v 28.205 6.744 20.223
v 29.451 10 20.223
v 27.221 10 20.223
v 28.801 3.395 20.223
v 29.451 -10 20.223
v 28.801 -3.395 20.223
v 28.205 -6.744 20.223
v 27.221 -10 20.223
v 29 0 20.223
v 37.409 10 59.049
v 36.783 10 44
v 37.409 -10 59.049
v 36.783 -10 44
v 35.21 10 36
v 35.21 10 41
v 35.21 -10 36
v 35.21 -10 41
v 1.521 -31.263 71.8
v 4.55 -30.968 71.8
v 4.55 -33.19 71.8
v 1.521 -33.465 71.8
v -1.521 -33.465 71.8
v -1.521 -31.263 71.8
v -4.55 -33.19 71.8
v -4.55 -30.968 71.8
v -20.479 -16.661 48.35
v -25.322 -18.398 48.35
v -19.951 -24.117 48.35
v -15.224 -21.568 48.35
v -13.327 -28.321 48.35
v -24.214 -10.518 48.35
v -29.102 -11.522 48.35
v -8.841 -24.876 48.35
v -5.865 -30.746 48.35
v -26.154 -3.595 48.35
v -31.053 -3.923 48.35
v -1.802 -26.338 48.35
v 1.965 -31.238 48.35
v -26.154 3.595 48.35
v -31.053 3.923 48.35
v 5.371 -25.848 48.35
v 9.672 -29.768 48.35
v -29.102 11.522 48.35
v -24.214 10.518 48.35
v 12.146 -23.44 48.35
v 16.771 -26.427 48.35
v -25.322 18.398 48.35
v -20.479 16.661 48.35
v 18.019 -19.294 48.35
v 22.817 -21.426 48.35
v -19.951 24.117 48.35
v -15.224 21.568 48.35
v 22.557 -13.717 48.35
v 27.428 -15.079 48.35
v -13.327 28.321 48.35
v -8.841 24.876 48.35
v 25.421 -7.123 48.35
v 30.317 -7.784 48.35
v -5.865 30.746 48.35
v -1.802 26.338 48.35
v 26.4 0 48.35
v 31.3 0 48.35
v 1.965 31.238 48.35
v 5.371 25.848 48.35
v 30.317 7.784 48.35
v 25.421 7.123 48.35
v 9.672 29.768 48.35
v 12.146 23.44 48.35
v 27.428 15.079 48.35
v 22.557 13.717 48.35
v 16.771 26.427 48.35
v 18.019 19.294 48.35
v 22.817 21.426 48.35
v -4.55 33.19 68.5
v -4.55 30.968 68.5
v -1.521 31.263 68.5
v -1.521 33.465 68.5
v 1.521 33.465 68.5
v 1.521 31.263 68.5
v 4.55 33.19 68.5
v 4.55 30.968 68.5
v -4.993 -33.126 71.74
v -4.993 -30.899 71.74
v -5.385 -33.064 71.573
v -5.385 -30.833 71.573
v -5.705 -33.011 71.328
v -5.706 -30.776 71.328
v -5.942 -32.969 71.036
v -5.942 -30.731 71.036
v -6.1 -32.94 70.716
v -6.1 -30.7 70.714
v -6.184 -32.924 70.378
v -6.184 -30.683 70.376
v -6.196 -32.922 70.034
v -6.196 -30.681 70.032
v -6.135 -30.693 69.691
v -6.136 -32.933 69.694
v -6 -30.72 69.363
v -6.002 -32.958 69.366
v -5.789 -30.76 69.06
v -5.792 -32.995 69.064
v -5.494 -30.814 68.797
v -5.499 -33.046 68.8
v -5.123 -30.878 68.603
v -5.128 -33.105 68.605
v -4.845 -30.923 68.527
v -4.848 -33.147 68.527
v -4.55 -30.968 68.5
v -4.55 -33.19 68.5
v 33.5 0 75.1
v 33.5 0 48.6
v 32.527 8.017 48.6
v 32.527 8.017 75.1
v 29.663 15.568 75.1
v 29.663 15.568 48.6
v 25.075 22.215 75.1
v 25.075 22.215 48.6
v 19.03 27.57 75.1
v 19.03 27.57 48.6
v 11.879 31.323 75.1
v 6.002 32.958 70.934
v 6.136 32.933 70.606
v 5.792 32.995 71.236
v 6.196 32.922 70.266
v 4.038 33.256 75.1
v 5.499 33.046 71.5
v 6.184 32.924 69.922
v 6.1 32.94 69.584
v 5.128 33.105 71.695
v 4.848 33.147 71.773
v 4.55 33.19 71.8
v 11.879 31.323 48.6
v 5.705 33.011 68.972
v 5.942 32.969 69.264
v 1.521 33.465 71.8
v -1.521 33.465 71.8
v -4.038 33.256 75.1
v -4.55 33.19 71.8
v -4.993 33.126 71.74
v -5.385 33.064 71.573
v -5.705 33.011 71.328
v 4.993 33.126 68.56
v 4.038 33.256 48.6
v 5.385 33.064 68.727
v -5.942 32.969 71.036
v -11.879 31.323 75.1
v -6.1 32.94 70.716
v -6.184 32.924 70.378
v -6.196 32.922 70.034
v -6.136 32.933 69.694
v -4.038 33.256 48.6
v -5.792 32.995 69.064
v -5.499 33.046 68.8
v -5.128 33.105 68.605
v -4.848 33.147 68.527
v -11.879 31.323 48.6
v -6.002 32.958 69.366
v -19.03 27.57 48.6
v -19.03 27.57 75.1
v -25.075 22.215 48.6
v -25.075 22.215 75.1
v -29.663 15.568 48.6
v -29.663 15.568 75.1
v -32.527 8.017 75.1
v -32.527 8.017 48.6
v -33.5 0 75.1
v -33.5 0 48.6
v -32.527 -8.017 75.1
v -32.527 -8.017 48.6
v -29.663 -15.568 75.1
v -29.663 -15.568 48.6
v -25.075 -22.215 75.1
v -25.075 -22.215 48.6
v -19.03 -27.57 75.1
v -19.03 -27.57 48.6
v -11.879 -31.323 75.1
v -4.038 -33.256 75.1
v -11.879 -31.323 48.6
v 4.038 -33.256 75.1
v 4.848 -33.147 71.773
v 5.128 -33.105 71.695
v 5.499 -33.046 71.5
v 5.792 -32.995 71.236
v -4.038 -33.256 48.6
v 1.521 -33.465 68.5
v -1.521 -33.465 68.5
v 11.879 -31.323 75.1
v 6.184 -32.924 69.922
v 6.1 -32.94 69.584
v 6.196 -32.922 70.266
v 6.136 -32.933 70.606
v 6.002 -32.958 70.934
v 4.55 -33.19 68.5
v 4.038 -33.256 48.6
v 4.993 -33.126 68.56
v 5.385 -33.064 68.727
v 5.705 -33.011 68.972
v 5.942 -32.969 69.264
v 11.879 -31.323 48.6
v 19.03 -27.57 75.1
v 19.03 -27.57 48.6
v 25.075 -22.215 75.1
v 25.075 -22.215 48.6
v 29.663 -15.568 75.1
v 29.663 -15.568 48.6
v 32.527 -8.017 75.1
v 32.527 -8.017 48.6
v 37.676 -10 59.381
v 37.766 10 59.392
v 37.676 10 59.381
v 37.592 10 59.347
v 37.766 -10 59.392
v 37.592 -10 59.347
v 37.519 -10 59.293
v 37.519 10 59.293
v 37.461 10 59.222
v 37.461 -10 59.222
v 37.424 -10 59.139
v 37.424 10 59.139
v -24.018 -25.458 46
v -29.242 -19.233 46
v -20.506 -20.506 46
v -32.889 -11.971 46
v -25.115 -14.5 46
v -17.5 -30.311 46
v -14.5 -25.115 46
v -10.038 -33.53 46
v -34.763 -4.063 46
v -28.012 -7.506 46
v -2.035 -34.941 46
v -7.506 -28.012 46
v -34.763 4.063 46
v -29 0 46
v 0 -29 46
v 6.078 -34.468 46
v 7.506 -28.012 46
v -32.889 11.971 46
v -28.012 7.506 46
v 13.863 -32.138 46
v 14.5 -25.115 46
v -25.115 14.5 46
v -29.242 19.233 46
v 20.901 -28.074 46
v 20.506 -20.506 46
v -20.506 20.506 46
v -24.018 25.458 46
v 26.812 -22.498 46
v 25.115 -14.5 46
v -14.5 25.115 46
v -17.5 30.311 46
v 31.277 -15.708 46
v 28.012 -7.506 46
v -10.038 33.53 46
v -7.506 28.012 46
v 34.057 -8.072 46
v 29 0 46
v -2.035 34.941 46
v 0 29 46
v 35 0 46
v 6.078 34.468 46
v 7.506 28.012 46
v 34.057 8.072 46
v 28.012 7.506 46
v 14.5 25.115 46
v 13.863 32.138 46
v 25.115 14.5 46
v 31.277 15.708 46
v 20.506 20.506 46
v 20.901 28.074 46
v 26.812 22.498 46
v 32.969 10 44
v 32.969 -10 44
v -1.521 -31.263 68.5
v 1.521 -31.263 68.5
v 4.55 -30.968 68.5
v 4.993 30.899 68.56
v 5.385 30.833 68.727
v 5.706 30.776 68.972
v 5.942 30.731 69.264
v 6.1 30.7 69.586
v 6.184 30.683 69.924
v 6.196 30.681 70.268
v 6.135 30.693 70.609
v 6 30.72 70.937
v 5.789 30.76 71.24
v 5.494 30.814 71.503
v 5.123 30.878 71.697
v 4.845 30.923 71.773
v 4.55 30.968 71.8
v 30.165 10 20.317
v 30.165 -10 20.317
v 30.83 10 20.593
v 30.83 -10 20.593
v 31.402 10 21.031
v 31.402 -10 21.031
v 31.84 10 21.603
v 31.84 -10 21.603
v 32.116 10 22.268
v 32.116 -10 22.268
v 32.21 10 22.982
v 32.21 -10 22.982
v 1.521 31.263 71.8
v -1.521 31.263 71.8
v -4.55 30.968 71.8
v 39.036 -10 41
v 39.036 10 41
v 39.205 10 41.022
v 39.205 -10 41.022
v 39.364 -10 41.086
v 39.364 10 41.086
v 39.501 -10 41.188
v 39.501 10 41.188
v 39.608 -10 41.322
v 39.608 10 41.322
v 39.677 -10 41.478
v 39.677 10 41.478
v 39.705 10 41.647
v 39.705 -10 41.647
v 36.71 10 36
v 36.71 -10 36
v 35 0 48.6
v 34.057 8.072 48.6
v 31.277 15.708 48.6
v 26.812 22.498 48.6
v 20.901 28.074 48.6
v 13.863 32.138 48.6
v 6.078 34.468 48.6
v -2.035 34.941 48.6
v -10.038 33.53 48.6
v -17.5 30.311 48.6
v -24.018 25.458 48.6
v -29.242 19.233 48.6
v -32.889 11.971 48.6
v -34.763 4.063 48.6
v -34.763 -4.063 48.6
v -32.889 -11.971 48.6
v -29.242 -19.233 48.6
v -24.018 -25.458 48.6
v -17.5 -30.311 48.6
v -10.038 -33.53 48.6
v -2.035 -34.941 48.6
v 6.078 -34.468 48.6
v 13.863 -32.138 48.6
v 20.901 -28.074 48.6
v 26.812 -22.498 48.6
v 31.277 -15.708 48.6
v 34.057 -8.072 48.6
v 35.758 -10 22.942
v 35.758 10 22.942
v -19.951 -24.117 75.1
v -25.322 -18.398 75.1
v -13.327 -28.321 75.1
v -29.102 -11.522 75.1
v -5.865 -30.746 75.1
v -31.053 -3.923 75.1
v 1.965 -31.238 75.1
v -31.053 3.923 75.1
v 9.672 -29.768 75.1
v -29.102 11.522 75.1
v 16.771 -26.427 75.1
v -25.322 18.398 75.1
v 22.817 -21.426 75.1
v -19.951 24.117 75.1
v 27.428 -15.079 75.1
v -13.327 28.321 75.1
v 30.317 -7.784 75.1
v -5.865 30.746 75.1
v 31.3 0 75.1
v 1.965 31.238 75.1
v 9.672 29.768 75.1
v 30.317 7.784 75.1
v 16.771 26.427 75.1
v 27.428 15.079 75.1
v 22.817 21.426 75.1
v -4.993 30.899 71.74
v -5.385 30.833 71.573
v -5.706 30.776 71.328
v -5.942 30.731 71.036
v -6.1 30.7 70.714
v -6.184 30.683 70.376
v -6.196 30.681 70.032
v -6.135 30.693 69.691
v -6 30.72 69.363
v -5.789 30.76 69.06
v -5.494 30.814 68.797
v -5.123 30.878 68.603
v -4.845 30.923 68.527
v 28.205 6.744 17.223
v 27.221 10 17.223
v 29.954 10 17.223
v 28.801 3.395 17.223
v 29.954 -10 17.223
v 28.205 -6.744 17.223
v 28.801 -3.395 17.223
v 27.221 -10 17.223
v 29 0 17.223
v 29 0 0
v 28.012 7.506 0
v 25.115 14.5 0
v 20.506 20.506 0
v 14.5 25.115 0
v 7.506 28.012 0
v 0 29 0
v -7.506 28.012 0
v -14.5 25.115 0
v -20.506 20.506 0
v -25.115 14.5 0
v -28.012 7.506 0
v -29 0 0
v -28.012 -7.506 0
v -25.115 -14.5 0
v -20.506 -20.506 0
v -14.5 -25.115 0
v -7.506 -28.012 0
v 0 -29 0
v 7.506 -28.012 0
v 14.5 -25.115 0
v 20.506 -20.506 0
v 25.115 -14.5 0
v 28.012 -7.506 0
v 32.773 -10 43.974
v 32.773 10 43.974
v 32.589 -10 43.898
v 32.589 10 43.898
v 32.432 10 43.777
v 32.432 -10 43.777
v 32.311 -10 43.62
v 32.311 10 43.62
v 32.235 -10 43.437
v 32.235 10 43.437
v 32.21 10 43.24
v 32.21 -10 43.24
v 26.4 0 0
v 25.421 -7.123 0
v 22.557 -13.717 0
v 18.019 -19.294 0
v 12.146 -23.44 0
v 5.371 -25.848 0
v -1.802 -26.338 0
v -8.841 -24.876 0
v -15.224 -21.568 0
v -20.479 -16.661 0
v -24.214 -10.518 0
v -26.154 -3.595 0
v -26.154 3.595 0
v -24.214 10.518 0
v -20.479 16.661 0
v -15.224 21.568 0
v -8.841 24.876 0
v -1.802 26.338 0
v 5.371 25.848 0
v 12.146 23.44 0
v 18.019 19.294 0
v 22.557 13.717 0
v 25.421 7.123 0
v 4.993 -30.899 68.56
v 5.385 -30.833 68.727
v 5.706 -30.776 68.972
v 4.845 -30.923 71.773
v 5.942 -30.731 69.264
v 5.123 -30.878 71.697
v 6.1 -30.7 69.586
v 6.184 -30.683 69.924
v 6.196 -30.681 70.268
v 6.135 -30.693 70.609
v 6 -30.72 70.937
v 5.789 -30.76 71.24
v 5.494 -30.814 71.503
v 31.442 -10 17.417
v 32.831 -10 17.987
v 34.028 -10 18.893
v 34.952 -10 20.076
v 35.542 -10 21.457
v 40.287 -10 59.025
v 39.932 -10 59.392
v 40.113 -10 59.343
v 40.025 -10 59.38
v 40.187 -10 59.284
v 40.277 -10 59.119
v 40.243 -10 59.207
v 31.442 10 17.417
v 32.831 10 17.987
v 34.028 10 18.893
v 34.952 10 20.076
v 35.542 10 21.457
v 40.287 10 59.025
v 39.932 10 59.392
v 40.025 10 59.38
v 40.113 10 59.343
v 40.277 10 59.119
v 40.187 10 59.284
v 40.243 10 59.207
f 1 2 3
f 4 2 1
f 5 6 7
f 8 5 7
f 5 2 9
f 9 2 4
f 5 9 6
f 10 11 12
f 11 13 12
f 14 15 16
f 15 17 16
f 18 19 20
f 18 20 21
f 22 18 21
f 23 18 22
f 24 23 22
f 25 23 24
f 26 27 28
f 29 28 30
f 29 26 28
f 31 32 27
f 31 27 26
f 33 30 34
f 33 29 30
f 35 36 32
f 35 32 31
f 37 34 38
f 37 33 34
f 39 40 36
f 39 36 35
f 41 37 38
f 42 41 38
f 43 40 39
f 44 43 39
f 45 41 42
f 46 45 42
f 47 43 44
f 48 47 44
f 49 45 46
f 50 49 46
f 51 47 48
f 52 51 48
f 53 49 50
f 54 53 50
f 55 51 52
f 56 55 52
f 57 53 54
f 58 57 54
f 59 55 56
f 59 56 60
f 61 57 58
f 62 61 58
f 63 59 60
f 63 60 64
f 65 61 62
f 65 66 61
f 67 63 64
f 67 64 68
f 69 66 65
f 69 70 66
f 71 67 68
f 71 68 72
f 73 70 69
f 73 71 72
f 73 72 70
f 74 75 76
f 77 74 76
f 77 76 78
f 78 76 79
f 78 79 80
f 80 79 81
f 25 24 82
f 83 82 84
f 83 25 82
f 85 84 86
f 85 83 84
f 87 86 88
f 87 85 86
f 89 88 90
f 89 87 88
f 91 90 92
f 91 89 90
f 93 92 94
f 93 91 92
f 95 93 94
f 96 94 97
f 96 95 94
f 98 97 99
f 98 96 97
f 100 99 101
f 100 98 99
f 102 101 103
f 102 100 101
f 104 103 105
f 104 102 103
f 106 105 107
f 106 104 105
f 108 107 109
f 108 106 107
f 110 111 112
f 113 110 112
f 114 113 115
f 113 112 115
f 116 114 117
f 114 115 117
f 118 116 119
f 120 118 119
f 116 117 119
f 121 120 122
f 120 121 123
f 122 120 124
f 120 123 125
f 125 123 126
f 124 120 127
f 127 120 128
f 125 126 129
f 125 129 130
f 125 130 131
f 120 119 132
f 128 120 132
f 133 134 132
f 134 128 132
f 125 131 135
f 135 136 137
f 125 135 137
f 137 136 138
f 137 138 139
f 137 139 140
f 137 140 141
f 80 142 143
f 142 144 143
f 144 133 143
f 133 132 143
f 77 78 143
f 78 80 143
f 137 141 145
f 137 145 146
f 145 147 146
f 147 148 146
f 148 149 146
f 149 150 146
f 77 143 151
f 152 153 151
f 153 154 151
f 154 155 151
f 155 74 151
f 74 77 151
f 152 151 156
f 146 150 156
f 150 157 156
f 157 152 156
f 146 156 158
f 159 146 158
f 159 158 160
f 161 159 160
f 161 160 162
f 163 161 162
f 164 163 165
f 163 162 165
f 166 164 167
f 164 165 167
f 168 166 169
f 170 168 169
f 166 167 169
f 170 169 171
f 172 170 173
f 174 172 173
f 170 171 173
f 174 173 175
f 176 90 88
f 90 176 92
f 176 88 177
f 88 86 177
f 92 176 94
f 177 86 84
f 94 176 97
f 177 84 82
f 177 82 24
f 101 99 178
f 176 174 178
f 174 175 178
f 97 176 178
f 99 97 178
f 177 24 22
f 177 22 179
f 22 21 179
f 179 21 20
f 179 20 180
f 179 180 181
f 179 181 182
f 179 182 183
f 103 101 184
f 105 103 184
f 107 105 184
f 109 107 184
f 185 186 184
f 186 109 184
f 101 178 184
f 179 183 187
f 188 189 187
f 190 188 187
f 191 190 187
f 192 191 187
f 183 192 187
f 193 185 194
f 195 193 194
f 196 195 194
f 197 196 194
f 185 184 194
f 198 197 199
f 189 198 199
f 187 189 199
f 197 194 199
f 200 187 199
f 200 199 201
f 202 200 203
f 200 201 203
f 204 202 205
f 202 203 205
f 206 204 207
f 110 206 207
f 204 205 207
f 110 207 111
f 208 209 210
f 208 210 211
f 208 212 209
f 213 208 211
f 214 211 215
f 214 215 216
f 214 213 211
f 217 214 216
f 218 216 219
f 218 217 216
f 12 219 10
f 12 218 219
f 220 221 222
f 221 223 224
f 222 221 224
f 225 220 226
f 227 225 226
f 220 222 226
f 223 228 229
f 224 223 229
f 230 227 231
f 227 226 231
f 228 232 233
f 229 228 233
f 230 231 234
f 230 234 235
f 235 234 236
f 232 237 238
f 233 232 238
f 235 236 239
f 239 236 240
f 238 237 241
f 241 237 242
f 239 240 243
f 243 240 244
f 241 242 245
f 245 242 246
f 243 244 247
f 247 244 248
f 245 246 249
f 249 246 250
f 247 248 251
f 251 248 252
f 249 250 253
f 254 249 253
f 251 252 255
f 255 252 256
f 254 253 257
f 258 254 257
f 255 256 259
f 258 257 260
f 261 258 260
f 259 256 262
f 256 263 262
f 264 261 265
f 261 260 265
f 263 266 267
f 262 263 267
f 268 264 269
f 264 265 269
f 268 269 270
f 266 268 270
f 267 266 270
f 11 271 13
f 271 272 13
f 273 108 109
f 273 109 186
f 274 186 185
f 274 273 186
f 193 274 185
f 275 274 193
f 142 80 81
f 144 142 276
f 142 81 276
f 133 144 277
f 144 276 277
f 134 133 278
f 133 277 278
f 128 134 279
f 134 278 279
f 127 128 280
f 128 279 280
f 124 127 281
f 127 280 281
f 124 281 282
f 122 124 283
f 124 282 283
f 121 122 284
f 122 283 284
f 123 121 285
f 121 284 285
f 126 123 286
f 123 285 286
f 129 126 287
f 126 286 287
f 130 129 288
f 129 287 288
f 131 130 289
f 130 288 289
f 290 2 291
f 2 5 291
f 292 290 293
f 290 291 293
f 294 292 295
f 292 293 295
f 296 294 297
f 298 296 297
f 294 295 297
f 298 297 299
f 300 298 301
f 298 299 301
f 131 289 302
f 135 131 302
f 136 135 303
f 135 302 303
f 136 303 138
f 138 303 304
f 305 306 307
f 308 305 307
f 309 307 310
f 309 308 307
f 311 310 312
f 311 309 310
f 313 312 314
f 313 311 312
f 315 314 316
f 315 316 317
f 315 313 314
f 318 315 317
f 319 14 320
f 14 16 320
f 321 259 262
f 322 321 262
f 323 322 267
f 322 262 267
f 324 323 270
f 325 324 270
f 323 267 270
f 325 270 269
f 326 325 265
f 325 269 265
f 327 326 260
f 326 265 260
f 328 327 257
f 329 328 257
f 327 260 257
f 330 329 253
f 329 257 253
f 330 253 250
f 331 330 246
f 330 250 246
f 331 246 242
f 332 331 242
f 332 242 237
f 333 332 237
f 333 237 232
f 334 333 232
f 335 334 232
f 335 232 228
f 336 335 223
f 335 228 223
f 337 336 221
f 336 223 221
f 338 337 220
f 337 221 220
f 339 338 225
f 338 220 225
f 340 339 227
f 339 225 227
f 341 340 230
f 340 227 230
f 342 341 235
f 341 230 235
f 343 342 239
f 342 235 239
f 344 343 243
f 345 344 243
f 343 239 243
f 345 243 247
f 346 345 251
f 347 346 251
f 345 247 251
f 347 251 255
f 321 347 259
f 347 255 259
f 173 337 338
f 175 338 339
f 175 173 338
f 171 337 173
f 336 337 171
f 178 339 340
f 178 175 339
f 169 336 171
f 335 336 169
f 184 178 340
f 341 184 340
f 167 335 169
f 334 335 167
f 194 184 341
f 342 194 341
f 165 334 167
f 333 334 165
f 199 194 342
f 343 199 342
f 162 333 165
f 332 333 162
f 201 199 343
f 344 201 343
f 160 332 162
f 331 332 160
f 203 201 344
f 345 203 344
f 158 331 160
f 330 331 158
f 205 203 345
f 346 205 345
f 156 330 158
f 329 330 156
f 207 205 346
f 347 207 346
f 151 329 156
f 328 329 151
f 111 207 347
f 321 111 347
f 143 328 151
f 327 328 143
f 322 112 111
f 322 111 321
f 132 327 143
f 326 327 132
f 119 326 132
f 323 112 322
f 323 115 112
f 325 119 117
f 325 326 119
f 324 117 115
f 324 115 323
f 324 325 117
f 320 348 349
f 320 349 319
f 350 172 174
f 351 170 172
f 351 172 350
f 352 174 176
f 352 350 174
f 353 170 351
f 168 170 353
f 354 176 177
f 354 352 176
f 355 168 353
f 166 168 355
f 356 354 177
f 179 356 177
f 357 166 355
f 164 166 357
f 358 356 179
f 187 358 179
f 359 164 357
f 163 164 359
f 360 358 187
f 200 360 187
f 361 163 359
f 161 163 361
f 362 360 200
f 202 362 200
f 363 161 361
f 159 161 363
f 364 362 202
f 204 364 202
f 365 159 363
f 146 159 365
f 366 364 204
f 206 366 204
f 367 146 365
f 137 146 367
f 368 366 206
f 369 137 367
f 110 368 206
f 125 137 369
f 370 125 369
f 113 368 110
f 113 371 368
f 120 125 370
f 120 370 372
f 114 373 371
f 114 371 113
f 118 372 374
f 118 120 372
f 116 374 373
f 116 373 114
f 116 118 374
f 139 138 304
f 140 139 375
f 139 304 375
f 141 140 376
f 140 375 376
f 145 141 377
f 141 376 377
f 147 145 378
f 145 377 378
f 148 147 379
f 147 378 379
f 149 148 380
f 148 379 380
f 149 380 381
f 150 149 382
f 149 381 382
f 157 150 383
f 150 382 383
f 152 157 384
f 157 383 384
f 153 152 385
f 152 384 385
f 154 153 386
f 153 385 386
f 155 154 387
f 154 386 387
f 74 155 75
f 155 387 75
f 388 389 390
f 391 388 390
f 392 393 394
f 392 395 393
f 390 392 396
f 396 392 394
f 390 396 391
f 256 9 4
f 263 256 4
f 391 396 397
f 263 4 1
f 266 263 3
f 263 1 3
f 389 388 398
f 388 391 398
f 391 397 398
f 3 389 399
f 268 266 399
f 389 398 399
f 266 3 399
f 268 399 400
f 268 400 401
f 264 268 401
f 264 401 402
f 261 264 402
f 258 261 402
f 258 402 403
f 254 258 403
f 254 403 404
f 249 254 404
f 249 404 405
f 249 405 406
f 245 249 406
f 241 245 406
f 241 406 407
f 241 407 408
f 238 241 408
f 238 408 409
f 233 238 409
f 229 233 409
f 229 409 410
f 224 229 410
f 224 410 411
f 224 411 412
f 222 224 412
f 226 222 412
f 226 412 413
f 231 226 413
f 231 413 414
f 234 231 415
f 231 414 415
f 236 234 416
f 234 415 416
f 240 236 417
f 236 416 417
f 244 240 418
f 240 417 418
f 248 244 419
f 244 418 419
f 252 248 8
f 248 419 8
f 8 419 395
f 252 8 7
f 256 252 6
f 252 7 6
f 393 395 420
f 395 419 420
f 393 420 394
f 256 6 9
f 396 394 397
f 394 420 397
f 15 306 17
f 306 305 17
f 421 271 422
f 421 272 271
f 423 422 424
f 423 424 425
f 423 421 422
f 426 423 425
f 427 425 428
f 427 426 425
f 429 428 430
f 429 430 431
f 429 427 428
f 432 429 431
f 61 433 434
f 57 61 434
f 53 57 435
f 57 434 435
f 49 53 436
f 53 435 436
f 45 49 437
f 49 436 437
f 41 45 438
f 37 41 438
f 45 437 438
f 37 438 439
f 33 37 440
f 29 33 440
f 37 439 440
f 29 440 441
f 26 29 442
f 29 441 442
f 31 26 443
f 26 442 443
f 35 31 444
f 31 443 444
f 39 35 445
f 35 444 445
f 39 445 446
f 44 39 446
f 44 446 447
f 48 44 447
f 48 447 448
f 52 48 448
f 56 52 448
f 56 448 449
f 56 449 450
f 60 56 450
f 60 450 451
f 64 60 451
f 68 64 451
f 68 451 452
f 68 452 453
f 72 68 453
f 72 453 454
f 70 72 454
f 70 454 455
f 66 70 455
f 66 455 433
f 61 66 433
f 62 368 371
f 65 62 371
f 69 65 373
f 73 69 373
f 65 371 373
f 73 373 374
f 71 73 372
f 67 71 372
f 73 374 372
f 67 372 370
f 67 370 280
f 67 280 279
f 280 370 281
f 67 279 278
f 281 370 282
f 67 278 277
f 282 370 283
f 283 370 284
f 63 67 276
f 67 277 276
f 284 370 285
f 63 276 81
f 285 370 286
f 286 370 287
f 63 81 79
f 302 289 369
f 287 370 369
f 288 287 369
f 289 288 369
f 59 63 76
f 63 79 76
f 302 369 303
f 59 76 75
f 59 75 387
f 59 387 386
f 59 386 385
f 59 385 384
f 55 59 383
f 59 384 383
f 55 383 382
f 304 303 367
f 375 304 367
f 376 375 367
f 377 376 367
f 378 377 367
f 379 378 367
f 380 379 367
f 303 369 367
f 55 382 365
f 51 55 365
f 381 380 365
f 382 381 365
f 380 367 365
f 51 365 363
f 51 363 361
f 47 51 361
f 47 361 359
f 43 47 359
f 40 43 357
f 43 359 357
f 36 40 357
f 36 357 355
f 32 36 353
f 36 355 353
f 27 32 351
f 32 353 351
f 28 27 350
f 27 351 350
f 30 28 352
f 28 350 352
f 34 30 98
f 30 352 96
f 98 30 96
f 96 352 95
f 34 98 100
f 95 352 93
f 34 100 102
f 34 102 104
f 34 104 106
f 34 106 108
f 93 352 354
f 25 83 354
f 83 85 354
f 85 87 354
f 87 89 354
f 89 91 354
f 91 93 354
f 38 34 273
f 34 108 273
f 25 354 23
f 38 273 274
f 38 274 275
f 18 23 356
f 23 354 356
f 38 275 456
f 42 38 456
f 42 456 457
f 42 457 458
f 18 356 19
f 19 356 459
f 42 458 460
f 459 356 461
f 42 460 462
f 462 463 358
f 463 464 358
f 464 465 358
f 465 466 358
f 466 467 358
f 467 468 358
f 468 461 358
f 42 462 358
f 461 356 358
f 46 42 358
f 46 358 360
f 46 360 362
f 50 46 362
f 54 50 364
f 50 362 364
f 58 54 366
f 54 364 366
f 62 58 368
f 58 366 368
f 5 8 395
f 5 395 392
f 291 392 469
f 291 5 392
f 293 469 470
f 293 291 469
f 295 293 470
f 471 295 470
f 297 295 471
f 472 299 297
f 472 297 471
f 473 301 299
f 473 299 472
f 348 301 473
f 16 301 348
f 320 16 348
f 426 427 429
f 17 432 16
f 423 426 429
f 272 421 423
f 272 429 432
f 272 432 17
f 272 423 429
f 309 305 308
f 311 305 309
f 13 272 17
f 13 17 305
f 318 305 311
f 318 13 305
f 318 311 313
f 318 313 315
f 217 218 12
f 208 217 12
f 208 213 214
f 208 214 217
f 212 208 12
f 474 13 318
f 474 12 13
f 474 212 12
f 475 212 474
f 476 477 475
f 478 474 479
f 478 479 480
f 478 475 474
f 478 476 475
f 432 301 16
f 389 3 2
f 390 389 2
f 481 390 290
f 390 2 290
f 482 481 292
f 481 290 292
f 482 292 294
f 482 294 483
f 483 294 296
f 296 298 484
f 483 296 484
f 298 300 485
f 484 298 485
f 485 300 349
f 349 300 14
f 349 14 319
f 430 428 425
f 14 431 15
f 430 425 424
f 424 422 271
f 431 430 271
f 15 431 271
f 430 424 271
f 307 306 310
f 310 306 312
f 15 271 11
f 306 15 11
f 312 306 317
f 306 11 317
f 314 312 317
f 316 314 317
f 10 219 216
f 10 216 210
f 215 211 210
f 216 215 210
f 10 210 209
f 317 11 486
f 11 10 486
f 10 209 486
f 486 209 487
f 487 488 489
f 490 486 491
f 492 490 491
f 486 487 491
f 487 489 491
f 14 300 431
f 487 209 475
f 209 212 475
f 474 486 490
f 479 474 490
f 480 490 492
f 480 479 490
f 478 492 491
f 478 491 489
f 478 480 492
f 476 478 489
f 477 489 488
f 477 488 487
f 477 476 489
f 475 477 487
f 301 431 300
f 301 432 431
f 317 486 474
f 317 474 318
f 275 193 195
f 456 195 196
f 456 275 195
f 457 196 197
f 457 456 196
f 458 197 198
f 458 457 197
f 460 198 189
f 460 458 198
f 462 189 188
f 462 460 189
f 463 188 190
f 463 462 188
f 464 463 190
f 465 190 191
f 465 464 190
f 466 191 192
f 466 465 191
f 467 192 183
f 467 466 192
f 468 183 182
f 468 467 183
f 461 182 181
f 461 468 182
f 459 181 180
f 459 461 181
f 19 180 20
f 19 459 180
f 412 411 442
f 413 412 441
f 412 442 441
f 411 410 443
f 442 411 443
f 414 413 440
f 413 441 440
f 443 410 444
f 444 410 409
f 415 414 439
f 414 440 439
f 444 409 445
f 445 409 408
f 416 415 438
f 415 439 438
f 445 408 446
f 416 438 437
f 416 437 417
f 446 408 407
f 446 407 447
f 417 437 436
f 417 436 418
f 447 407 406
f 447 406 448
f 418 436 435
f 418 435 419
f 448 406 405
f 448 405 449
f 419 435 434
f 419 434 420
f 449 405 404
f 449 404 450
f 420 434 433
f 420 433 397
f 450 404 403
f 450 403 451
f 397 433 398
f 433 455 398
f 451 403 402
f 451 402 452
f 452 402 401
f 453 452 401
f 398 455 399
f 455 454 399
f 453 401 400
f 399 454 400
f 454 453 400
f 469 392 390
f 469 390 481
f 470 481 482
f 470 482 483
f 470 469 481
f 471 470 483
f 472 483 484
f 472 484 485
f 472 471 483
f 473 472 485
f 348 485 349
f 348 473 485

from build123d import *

# Parameters (mm, degrees)
SKETCH_R             = 29
PAD_DEPTH            = 46
SKETCH001_R          = 35
PAD001_DEPTH         = 2.6
SKETCH002_R          = 33.5
PAD002_DEPTH         = 26.5
SKETCH003_R          = 26.4
POCKET_DEPTH         = 75.101
SKETCH004_R          = 31.3
POCKET001_DEPTH      = 26.75
POCKET002_DEPTH      = 35.001
POCKET002_DEPTH_BACK = -35.001
PAD003_DEPTH         = 10
PAD003_DEPTH_BACK    = 10


with BuildPart() as part:
    # Sketch → Pad (new body)
    with BuildSketch(Plane.XY):
        Circle(SKETCH_R)
    extrude(amount=PAD_DEPTH)

    # Sketch001 (on Face3 of Pad) → Pad001 (join)
    with BuildSketch(Plane.XY.offset(46)):
        Circle(SKETCH001_R)
    extrude(amount=PAD001_DEPTH)

    # Sketch002 (on Face3 of Pad001) → Pad002 (join)
    with BuildSketch(Plane.XY.offset(48.6)):
        Circle(SKETCH002_R)
    extrude(amount=PAD002_DEPTH)

    # Sketch003 (on Face6 of Pad002) → Pocket (cut, through all)
    with BuildSketch(Plane(origin=(0, 0, 0), x_dir=(1, 0, 0), z_dir=(0, 0, -1))):
        Circle(SKETCH003_R)
    extrude(amount=-POCKET_DEPTH, mode=Mode.SUBTRACT)

    # Sketch004 (on Face7 of Pocket) → Pocket001 (cut)
    with BuildSketch(Plane.XY.offset(75.1)):
        Circle(SKETCH004_R)
    extrude(amount=-POCKET001_DEPTH, mode=Mode.SUBTRACT)

    # Sketch005 → Pocket002 (cut, two sides)
    with BuildSketch(Plane.XZ) as pocket002_sk:
        with BuildLine():
            ThreePointArc((-4.55, 71.8), (-6.2, 70.15), (-4.55, 68.5))
            Line((-4.55, 68.5), (4.55, 68.5))
            ThreePointArc((4.55, 68.5), (6.2, 70.15), (4.55, 71.8))
            Line((4.55, 71.8), (-4.55, 71.8))
        make_face()
    extrude(amount=-POCKET002_DEPTH, mode=Mode.SUBTRACT)
    extrude(pocket002_sk.sketch, amount=-POCKET002_DEPTH_BACK, mode=Mode.SUBTRACT)

    # Sketch006 → Pad003 (join, two sides)
    with BuildSketch(Plane.XZ) as pad003_sk:
        with BuildLine():
            Line((26.712868, 17.22326), (29.953513, 17.22326))
            ThreePointArc((29.953513, 17.22326), (34.027862, 18.893168), (35.758251, 22.9422))
            Line((35.758251, 22.9422), (36.710471, 36))
            Line((35.210471, 36), (36.710471, 36))
            Line((35.210471, 41), (35.210471, 36))
            Line((39.035531, 41), (35.210471, 41))
            ThreePointArc((39.035531, 41), (39.500898, 41.188211), (39.704589, 41.647014))
            Line((40.286886, 59.024747), (39.704589, 41.647014))
            ThreePointArc((40.286886, 59.024747), (40.187131, 59.283799), (39.931564, 59.392174))
            Line((37.766381, 59.392174), (39.931564, 59.392174))
            ThreePointArc((37.766381, 59.392174), (37.518605, 59.292543), (37.408773, 59.049117))
            Line((36.783433, 44), (37.408773, 59.049117))
            Line((32.969388, 44), (36.783433, 44))
            ThreePointArc((32.969388, 44), (32.432134, 43.777462), (32.209597, 43.240208))
            Line((32.209597, 43.240208), (32.209597, 22.982091))
            ThreePointArc((29.450765, 20.22326), (31.401553, 21.031303), (32.209597, 22.982091))
            Line((29.450765, 20.22326), (26.712868, 20.22326))
            Line((26.712868, 20.22326), (26.712868, 17.22326))
        make_face()
    extrude(amount=PAD003_DEPTH)
    extrude(pad003_sk.sketch, amount=-PAD003_DEPTH_BACK)


solid = part.part
